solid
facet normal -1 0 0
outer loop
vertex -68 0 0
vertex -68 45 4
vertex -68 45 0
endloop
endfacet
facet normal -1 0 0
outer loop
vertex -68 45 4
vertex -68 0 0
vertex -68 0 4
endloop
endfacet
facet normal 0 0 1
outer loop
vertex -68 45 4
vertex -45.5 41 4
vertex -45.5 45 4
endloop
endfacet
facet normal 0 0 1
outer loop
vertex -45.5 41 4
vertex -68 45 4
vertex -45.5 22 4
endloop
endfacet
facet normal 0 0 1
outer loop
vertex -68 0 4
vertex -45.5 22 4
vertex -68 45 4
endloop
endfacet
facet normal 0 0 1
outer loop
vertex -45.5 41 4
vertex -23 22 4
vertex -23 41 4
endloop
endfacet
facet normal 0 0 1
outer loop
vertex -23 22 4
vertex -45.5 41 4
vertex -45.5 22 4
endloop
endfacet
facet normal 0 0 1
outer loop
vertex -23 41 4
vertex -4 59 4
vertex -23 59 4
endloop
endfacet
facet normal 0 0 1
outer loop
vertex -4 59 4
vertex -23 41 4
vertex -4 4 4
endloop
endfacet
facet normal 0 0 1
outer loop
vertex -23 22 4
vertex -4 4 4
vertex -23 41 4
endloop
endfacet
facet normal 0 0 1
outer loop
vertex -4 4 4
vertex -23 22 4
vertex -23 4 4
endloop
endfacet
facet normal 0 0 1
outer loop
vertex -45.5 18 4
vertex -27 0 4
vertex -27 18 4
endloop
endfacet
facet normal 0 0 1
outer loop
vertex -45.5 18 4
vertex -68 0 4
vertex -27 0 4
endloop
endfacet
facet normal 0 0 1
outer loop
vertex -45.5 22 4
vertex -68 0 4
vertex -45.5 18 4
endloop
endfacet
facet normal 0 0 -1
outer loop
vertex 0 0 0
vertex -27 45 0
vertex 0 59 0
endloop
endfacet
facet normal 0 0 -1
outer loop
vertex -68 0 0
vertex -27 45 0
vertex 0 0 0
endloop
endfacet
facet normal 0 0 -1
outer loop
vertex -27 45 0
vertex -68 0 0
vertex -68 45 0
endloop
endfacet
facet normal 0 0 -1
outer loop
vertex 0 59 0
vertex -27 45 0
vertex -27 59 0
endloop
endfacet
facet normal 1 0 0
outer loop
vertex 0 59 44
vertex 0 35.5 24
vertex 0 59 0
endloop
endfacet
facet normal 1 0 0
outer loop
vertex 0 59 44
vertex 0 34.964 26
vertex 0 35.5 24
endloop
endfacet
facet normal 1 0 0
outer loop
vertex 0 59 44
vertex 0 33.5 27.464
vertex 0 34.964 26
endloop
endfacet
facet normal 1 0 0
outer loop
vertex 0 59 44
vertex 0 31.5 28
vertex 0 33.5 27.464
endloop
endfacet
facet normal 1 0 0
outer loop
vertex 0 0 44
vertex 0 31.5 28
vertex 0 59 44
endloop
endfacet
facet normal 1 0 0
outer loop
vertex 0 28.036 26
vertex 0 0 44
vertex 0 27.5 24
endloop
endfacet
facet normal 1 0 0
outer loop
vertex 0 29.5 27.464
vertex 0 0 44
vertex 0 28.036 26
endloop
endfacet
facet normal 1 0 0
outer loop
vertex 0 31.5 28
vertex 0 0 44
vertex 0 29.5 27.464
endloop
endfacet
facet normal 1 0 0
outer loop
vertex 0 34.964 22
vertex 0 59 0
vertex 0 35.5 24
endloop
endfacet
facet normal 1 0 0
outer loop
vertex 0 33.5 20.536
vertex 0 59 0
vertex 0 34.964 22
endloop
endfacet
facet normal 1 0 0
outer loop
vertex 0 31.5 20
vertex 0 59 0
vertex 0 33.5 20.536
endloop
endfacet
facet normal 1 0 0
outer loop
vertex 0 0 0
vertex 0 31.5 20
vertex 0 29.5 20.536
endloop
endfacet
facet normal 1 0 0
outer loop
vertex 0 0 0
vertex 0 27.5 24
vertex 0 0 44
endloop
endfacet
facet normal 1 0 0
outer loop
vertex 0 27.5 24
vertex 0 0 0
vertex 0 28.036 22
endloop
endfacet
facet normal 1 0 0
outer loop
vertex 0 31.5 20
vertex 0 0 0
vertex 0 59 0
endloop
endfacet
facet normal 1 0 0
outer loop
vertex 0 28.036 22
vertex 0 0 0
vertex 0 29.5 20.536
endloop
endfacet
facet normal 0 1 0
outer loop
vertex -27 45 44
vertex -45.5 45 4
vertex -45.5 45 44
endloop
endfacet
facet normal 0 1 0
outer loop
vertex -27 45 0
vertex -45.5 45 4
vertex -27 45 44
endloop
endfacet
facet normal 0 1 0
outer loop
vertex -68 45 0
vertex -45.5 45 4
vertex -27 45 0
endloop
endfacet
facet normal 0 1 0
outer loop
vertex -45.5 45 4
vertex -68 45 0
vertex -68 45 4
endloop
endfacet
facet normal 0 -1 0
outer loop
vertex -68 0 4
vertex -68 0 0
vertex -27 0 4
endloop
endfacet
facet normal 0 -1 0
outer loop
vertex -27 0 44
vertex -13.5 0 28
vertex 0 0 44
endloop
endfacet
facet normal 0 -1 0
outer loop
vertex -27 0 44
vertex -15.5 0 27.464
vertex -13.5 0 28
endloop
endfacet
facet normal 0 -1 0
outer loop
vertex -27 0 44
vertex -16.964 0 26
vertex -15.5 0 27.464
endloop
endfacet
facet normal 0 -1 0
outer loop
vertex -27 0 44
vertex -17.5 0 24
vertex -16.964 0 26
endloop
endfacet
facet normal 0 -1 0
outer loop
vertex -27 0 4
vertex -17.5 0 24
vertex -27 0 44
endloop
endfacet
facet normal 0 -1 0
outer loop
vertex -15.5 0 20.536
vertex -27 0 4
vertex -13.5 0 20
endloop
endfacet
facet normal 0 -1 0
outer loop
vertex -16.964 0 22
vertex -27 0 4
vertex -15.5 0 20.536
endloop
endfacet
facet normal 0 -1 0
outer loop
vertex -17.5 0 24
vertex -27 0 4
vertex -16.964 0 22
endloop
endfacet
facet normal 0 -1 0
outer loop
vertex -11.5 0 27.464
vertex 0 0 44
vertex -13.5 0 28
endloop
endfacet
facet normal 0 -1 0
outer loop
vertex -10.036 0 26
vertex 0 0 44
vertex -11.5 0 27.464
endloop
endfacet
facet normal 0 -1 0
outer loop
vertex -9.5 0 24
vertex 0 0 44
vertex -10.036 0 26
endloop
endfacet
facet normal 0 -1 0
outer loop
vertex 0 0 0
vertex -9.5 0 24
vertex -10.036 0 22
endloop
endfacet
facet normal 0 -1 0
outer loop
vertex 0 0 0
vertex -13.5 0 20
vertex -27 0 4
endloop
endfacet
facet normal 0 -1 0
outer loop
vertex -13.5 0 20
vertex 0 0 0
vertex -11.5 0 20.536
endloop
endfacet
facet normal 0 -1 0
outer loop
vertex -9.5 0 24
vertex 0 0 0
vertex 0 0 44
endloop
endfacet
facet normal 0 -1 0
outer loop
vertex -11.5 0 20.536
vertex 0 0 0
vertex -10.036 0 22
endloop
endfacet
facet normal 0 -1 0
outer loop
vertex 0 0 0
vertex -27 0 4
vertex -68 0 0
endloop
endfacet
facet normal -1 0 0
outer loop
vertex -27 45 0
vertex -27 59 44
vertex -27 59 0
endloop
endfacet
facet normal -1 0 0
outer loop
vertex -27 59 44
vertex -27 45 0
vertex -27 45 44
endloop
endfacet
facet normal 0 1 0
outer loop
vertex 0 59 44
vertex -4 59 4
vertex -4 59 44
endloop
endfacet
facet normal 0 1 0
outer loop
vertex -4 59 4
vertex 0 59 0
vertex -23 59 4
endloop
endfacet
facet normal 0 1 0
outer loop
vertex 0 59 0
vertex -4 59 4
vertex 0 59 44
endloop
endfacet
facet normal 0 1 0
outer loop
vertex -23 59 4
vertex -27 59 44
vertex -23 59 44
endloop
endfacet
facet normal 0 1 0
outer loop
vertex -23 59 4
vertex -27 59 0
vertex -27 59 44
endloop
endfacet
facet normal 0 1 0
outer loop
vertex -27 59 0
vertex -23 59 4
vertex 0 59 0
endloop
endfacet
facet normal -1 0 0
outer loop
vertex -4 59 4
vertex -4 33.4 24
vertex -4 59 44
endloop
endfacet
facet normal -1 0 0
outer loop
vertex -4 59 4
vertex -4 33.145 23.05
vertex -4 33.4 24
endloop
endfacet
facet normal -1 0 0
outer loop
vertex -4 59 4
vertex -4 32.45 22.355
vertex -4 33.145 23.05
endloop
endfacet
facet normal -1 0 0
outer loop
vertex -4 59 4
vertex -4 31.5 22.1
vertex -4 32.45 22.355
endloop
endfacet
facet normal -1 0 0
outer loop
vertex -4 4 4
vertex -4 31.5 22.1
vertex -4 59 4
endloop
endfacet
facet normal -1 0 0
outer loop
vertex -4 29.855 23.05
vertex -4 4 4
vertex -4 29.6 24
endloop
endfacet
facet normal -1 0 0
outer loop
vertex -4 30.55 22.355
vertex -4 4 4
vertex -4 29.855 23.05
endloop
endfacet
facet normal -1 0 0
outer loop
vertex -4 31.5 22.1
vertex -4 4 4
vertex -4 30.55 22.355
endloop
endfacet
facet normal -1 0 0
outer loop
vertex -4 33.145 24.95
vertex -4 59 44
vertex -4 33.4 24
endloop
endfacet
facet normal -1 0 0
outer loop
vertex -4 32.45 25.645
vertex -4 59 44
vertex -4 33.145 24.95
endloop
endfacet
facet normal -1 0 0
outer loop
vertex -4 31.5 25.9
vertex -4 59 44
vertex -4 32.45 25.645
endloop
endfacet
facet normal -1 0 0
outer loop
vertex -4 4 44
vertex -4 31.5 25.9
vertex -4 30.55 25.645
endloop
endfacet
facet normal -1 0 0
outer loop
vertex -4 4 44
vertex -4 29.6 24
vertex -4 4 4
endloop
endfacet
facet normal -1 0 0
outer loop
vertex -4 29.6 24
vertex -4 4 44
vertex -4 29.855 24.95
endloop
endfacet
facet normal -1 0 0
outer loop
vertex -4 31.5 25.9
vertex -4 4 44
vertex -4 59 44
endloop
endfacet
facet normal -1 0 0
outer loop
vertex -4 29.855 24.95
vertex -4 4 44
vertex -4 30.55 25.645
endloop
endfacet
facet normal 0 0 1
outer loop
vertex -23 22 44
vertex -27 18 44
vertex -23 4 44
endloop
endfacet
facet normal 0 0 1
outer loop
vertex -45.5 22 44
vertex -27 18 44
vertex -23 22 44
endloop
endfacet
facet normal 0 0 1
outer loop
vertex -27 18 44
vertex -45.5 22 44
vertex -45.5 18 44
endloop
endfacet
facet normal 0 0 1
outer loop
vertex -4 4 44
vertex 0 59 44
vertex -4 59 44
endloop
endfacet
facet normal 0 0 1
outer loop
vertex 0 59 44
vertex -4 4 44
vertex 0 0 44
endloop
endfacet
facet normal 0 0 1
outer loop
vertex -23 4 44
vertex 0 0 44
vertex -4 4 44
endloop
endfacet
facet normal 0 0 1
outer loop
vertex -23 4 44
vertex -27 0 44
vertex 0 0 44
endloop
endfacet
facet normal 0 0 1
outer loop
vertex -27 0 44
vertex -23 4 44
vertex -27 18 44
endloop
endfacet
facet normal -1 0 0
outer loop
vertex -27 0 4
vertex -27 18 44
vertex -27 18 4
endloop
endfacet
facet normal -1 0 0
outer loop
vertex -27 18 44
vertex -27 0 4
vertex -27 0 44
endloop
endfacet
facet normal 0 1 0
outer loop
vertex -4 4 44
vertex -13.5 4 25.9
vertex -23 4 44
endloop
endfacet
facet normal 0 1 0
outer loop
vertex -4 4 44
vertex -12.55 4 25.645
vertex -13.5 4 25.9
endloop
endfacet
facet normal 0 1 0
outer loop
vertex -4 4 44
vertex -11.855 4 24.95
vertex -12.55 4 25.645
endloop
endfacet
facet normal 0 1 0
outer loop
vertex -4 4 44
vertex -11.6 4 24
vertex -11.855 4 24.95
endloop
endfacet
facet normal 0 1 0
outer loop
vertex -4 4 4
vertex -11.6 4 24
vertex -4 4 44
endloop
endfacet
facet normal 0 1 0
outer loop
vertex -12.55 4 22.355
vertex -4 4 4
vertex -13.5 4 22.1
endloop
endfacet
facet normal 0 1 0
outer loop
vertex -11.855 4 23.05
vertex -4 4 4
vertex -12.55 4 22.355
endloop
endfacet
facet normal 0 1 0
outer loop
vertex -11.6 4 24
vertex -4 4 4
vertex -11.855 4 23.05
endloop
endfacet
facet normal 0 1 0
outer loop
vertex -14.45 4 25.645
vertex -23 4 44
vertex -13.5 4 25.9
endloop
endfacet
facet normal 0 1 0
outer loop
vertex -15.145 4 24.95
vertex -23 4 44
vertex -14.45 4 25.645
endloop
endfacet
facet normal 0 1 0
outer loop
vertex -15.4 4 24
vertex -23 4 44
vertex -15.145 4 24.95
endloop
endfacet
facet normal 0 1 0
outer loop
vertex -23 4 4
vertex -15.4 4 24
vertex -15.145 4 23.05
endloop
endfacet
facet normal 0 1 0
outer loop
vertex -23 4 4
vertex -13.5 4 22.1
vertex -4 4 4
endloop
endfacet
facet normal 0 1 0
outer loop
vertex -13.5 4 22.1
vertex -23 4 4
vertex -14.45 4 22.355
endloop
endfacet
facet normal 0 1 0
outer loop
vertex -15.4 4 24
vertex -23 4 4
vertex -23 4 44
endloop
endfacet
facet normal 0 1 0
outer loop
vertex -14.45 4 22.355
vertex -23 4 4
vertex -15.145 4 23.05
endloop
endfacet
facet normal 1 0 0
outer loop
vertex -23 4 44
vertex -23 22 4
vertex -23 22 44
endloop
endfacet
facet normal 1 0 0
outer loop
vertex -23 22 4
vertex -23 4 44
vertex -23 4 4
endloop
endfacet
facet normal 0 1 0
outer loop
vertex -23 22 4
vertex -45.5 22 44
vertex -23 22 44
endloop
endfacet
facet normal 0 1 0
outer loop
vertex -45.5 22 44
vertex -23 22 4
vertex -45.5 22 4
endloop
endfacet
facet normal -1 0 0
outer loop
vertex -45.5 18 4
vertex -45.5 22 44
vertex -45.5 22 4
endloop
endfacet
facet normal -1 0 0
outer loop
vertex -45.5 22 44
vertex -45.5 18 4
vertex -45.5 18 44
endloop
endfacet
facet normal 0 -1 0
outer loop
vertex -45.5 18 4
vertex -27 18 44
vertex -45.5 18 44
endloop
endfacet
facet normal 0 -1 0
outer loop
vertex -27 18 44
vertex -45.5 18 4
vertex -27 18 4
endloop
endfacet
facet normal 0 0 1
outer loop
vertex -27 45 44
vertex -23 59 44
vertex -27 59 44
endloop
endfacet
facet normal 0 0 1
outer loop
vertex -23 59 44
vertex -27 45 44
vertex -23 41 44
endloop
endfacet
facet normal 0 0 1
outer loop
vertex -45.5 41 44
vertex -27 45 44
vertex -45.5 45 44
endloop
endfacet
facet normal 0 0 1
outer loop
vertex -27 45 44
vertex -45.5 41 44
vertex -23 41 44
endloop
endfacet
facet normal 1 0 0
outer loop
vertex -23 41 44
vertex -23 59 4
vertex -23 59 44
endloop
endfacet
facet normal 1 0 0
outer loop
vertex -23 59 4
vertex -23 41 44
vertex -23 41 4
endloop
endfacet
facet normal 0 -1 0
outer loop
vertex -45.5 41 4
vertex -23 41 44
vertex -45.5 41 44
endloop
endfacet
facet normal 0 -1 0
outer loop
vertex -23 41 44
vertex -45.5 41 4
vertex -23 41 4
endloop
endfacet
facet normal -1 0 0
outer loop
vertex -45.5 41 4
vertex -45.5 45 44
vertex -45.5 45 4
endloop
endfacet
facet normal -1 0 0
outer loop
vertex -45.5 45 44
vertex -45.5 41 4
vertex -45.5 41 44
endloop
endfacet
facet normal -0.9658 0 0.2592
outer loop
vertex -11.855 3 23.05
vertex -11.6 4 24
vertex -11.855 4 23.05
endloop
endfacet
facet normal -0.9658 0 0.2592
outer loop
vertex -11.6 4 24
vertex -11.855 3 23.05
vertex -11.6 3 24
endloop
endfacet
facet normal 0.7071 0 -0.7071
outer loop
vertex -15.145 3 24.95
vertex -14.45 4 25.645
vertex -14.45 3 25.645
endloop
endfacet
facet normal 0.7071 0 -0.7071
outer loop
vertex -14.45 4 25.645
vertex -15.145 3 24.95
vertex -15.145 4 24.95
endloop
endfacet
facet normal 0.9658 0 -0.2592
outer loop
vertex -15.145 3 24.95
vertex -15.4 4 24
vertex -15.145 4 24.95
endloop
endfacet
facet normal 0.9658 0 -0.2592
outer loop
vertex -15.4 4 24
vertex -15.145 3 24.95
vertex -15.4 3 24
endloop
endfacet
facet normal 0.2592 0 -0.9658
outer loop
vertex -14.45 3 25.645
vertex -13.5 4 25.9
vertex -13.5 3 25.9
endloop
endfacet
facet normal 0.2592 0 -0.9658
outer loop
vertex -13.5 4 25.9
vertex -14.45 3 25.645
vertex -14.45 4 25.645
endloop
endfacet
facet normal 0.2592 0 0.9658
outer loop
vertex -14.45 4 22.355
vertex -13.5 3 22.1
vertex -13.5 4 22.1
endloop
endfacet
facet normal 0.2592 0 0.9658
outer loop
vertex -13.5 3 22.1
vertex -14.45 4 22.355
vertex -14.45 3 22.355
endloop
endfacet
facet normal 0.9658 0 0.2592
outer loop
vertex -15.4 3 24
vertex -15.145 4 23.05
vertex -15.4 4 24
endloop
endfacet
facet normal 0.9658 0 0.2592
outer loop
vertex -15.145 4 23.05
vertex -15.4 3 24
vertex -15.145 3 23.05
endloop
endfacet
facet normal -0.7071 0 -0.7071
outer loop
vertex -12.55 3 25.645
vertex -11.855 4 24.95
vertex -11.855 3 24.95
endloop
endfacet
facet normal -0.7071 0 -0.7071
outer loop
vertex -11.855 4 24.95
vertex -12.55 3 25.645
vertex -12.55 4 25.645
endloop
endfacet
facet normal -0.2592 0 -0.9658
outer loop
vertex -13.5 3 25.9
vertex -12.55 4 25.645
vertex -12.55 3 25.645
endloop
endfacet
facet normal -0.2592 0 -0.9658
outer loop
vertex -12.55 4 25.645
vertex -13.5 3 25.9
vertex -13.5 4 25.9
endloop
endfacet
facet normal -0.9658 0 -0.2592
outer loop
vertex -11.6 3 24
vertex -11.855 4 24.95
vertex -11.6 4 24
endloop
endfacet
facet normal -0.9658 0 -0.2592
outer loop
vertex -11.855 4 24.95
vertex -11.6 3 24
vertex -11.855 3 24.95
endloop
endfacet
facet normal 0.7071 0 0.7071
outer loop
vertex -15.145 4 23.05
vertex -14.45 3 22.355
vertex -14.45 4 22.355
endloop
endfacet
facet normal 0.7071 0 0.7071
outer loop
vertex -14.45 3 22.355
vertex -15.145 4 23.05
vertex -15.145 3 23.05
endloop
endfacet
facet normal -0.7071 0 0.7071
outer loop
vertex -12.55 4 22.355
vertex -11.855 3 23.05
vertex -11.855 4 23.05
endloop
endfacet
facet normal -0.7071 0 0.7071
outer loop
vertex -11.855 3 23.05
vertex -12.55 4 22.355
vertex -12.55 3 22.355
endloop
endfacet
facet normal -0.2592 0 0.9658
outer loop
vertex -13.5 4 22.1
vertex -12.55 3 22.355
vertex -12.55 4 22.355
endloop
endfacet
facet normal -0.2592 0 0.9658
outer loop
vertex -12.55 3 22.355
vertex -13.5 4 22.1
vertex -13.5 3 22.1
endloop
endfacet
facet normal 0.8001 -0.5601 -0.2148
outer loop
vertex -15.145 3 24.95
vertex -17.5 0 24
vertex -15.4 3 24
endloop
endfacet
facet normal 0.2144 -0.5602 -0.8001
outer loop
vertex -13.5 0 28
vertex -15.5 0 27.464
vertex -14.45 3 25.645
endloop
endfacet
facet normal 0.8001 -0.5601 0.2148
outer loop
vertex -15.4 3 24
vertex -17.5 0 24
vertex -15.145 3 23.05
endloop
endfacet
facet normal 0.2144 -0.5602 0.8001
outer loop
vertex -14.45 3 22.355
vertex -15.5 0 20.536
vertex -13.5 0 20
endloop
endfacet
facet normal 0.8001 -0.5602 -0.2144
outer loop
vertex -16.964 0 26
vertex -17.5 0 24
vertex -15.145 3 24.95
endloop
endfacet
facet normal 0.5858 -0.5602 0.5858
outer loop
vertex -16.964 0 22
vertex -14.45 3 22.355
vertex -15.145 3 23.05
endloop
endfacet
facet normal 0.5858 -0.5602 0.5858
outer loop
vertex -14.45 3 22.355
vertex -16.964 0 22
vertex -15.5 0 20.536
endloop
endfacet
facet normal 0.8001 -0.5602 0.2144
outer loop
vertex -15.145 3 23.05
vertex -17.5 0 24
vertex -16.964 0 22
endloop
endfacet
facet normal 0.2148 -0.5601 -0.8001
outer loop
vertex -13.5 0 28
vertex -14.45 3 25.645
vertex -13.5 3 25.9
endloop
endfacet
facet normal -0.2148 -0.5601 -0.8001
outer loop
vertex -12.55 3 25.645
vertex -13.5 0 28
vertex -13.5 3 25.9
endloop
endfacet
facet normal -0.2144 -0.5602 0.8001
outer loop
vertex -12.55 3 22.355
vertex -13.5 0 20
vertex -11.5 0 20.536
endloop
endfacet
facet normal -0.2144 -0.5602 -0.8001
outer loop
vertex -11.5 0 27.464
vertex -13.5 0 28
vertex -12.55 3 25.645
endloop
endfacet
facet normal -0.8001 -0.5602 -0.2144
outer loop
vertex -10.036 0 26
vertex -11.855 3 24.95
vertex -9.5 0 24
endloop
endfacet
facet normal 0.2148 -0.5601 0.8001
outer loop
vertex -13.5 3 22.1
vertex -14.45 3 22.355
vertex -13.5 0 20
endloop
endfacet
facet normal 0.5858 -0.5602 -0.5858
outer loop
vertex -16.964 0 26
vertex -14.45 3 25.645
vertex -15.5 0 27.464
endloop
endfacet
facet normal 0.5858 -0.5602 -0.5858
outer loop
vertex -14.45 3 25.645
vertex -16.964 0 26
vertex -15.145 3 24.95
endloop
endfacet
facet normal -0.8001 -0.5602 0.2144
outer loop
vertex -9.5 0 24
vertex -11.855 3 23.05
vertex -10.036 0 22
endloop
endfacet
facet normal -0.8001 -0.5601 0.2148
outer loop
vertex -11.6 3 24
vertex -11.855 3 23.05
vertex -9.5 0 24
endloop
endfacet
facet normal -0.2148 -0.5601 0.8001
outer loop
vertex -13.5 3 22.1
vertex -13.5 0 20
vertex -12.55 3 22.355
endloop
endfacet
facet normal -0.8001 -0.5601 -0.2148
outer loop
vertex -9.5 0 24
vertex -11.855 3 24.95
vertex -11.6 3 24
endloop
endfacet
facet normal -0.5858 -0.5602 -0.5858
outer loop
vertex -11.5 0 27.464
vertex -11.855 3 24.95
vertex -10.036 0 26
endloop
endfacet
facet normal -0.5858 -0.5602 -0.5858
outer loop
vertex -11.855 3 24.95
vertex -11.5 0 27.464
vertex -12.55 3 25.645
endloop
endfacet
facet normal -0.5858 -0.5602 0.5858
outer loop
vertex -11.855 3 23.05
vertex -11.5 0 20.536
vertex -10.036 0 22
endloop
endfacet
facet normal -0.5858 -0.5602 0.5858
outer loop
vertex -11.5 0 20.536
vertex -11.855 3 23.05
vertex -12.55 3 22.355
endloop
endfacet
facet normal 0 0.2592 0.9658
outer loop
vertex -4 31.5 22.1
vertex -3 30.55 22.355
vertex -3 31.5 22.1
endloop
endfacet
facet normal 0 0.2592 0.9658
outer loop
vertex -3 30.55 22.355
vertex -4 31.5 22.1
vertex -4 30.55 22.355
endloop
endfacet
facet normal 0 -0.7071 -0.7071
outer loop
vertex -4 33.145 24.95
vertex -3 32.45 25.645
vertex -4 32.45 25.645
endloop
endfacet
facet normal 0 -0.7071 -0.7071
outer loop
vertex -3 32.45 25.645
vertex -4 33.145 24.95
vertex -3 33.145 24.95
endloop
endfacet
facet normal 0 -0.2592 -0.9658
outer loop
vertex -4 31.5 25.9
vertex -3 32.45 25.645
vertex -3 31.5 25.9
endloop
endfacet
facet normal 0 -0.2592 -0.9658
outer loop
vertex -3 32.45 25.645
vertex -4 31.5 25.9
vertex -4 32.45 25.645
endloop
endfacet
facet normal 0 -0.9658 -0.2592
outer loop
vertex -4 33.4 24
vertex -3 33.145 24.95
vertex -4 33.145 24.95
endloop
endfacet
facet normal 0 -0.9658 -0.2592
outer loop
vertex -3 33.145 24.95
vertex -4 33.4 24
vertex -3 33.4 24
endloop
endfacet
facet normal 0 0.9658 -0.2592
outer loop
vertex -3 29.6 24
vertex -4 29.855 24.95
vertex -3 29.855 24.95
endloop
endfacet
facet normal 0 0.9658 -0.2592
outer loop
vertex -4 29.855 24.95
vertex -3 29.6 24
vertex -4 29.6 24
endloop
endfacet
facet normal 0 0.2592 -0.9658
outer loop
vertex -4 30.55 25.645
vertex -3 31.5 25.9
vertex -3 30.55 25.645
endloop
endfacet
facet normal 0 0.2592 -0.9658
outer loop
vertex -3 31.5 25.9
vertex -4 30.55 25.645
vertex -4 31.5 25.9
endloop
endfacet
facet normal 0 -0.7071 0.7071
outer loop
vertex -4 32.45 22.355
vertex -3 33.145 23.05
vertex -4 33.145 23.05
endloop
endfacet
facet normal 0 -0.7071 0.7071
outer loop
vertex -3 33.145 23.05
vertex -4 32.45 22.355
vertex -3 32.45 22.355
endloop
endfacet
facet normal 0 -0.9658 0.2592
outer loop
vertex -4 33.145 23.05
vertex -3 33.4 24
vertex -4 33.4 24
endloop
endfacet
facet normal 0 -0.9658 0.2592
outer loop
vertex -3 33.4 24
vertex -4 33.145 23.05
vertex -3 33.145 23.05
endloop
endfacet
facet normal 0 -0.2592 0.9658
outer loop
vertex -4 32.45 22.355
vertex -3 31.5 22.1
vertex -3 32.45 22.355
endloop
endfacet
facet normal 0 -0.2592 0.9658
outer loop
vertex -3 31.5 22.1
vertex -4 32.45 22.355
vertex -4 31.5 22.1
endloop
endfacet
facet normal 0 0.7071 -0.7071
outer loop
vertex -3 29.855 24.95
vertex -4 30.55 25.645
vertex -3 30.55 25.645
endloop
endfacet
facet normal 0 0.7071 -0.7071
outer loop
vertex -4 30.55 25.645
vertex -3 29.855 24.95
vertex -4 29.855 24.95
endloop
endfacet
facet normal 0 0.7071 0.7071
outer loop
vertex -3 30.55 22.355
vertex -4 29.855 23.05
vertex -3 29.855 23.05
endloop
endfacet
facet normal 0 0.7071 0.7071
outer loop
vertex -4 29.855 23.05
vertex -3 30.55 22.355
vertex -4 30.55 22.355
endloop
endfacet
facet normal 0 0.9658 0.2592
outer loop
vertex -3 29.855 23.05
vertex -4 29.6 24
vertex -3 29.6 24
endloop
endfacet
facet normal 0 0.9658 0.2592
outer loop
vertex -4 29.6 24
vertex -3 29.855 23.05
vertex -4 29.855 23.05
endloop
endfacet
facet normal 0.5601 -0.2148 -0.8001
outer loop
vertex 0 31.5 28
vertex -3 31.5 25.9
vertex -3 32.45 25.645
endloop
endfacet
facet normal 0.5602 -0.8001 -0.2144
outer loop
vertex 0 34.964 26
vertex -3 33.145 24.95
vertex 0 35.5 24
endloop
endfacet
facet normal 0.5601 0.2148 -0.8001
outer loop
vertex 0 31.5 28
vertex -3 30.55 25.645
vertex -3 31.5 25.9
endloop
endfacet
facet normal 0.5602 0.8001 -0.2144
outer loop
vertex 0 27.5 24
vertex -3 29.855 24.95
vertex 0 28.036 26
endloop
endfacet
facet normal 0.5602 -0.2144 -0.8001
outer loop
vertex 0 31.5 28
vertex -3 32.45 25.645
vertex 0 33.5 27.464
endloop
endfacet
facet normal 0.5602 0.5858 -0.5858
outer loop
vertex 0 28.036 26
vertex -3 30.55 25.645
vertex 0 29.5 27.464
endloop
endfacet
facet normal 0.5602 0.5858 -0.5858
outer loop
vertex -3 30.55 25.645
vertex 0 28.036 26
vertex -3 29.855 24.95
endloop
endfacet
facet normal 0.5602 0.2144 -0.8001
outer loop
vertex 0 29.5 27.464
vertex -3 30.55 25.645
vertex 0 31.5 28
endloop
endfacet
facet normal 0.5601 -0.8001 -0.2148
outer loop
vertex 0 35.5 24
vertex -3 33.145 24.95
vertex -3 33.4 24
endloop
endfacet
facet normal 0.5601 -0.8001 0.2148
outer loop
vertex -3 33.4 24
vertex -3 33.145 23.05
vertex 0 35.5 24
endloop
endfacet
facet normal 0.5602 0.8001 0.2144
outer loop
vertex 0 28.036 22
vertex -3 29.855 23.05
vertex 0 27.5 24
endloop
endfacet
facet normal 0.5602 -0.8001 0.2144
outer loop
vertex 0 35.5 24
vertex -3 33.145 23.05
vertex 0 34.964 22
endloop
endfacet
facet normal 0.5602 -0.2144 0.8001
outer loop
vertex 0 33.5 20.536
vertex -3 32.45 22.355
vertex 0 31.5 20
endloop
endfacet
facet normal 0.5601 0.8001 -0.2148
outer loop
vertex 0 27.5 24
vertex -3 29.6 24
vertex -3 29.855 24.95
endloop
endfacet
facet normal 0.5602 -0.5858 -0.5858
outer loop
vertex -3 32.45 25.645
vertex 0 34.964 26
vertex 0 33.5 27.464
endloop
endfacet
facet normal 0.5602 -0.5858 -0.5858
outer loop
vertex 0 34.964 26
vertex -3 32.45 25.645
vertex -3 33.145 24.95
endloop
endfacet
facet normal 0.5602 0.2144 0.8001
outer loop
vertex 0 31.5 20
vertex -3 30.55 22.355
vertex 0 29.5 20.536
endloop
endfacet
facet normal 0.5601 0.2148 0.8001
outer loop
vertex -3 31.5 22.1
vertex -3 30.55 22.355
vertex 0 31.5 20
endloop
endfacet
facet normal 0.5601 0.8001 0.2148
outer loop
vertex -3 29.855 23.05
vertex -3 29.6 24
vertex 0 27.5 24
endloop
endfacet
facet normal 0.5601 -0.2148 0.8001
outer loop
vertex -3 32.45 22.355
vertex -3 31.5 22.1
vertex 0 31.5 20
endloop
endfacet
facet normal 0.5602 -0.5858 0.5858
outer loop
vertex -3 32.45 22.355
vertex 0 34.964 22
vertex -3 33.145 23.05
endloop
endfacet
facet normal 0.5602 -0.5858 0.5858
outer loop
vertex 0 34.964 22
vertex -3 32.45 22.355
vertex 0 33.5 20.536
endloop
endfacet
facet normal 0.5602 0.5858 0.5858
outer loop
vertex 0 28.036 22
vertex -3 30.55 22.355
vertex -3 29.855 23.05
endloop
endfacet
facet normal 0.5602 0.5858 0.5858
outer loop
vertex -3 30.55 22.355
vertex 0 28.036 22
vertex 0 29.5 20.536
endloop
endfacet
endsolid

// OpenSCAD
difference(){
	scale(v = [-1, 1, 1]) {
		union() {
			union() {
				cube(size = [68, 45, 4]);
				cube(size = [27, 59, 4]);
			}
			translate(v = [0, 0, 4]) {
				cube(size = [4, 59, 40]);
			}
			translate(v = [0, 0, 4]) {
				cube(size = [27, 4, 40]);
			}
			translate(v = [23, 0, 4]) {
				cube(size = [4, 22, 40]);
			}
			translate(v = [23, 18, 4]) {
				cube(size = [22.5000000000, 4, 40]);
			}
			translate(v = [23, 41, 4]) {
				cube(size = [4, 18, 40]);
			}
			translate(v = [23, 41, 4]) {
				cube(size = [22.5000000000, 4, 40]);
			}
		}
	}
	/* Holes Below*/
	scale(v = [-1, 1, 1]){
		union(){
			translate(v = [13.5000000000, 0, 24.0000000000]) {
				rotate(a = 90, v = [1, 0, 0]) {
					union() {
						union() {
							translate(v = [0, 0, -5]) {
								cylinder($fn = 12, h = 5, r = 1.9000000000);
							}
							translate(v = [0, 0, -3]) {
								cylinder($fn = 12, h = 3, r1 = 1.9000000000, r2 = 4);
							}
						}
						cylinder($fn = 12, h = 1, r = 4);
					}
				}
			}
			translate(v = [0, 31.5000000000, 24.0000000000]) {
				rotate(a = -90, v = [0, 1, 0]) {
					union() {
						union() {
							translate(v = [0, 0, -5]) {
								cylinder($fn = 12, h = 5, r = 1.9000000000);
							}
							translate(v = [0, 0, -3]) {
								cylinder($fn = 12, h = 3, r1 = 1.9000000000, r2 = 4);
							}
						}
						cylinder($fn = 12, h = 1, r = 4);
					}
				}
			}
		}
	} /* End Holes */ 
}
